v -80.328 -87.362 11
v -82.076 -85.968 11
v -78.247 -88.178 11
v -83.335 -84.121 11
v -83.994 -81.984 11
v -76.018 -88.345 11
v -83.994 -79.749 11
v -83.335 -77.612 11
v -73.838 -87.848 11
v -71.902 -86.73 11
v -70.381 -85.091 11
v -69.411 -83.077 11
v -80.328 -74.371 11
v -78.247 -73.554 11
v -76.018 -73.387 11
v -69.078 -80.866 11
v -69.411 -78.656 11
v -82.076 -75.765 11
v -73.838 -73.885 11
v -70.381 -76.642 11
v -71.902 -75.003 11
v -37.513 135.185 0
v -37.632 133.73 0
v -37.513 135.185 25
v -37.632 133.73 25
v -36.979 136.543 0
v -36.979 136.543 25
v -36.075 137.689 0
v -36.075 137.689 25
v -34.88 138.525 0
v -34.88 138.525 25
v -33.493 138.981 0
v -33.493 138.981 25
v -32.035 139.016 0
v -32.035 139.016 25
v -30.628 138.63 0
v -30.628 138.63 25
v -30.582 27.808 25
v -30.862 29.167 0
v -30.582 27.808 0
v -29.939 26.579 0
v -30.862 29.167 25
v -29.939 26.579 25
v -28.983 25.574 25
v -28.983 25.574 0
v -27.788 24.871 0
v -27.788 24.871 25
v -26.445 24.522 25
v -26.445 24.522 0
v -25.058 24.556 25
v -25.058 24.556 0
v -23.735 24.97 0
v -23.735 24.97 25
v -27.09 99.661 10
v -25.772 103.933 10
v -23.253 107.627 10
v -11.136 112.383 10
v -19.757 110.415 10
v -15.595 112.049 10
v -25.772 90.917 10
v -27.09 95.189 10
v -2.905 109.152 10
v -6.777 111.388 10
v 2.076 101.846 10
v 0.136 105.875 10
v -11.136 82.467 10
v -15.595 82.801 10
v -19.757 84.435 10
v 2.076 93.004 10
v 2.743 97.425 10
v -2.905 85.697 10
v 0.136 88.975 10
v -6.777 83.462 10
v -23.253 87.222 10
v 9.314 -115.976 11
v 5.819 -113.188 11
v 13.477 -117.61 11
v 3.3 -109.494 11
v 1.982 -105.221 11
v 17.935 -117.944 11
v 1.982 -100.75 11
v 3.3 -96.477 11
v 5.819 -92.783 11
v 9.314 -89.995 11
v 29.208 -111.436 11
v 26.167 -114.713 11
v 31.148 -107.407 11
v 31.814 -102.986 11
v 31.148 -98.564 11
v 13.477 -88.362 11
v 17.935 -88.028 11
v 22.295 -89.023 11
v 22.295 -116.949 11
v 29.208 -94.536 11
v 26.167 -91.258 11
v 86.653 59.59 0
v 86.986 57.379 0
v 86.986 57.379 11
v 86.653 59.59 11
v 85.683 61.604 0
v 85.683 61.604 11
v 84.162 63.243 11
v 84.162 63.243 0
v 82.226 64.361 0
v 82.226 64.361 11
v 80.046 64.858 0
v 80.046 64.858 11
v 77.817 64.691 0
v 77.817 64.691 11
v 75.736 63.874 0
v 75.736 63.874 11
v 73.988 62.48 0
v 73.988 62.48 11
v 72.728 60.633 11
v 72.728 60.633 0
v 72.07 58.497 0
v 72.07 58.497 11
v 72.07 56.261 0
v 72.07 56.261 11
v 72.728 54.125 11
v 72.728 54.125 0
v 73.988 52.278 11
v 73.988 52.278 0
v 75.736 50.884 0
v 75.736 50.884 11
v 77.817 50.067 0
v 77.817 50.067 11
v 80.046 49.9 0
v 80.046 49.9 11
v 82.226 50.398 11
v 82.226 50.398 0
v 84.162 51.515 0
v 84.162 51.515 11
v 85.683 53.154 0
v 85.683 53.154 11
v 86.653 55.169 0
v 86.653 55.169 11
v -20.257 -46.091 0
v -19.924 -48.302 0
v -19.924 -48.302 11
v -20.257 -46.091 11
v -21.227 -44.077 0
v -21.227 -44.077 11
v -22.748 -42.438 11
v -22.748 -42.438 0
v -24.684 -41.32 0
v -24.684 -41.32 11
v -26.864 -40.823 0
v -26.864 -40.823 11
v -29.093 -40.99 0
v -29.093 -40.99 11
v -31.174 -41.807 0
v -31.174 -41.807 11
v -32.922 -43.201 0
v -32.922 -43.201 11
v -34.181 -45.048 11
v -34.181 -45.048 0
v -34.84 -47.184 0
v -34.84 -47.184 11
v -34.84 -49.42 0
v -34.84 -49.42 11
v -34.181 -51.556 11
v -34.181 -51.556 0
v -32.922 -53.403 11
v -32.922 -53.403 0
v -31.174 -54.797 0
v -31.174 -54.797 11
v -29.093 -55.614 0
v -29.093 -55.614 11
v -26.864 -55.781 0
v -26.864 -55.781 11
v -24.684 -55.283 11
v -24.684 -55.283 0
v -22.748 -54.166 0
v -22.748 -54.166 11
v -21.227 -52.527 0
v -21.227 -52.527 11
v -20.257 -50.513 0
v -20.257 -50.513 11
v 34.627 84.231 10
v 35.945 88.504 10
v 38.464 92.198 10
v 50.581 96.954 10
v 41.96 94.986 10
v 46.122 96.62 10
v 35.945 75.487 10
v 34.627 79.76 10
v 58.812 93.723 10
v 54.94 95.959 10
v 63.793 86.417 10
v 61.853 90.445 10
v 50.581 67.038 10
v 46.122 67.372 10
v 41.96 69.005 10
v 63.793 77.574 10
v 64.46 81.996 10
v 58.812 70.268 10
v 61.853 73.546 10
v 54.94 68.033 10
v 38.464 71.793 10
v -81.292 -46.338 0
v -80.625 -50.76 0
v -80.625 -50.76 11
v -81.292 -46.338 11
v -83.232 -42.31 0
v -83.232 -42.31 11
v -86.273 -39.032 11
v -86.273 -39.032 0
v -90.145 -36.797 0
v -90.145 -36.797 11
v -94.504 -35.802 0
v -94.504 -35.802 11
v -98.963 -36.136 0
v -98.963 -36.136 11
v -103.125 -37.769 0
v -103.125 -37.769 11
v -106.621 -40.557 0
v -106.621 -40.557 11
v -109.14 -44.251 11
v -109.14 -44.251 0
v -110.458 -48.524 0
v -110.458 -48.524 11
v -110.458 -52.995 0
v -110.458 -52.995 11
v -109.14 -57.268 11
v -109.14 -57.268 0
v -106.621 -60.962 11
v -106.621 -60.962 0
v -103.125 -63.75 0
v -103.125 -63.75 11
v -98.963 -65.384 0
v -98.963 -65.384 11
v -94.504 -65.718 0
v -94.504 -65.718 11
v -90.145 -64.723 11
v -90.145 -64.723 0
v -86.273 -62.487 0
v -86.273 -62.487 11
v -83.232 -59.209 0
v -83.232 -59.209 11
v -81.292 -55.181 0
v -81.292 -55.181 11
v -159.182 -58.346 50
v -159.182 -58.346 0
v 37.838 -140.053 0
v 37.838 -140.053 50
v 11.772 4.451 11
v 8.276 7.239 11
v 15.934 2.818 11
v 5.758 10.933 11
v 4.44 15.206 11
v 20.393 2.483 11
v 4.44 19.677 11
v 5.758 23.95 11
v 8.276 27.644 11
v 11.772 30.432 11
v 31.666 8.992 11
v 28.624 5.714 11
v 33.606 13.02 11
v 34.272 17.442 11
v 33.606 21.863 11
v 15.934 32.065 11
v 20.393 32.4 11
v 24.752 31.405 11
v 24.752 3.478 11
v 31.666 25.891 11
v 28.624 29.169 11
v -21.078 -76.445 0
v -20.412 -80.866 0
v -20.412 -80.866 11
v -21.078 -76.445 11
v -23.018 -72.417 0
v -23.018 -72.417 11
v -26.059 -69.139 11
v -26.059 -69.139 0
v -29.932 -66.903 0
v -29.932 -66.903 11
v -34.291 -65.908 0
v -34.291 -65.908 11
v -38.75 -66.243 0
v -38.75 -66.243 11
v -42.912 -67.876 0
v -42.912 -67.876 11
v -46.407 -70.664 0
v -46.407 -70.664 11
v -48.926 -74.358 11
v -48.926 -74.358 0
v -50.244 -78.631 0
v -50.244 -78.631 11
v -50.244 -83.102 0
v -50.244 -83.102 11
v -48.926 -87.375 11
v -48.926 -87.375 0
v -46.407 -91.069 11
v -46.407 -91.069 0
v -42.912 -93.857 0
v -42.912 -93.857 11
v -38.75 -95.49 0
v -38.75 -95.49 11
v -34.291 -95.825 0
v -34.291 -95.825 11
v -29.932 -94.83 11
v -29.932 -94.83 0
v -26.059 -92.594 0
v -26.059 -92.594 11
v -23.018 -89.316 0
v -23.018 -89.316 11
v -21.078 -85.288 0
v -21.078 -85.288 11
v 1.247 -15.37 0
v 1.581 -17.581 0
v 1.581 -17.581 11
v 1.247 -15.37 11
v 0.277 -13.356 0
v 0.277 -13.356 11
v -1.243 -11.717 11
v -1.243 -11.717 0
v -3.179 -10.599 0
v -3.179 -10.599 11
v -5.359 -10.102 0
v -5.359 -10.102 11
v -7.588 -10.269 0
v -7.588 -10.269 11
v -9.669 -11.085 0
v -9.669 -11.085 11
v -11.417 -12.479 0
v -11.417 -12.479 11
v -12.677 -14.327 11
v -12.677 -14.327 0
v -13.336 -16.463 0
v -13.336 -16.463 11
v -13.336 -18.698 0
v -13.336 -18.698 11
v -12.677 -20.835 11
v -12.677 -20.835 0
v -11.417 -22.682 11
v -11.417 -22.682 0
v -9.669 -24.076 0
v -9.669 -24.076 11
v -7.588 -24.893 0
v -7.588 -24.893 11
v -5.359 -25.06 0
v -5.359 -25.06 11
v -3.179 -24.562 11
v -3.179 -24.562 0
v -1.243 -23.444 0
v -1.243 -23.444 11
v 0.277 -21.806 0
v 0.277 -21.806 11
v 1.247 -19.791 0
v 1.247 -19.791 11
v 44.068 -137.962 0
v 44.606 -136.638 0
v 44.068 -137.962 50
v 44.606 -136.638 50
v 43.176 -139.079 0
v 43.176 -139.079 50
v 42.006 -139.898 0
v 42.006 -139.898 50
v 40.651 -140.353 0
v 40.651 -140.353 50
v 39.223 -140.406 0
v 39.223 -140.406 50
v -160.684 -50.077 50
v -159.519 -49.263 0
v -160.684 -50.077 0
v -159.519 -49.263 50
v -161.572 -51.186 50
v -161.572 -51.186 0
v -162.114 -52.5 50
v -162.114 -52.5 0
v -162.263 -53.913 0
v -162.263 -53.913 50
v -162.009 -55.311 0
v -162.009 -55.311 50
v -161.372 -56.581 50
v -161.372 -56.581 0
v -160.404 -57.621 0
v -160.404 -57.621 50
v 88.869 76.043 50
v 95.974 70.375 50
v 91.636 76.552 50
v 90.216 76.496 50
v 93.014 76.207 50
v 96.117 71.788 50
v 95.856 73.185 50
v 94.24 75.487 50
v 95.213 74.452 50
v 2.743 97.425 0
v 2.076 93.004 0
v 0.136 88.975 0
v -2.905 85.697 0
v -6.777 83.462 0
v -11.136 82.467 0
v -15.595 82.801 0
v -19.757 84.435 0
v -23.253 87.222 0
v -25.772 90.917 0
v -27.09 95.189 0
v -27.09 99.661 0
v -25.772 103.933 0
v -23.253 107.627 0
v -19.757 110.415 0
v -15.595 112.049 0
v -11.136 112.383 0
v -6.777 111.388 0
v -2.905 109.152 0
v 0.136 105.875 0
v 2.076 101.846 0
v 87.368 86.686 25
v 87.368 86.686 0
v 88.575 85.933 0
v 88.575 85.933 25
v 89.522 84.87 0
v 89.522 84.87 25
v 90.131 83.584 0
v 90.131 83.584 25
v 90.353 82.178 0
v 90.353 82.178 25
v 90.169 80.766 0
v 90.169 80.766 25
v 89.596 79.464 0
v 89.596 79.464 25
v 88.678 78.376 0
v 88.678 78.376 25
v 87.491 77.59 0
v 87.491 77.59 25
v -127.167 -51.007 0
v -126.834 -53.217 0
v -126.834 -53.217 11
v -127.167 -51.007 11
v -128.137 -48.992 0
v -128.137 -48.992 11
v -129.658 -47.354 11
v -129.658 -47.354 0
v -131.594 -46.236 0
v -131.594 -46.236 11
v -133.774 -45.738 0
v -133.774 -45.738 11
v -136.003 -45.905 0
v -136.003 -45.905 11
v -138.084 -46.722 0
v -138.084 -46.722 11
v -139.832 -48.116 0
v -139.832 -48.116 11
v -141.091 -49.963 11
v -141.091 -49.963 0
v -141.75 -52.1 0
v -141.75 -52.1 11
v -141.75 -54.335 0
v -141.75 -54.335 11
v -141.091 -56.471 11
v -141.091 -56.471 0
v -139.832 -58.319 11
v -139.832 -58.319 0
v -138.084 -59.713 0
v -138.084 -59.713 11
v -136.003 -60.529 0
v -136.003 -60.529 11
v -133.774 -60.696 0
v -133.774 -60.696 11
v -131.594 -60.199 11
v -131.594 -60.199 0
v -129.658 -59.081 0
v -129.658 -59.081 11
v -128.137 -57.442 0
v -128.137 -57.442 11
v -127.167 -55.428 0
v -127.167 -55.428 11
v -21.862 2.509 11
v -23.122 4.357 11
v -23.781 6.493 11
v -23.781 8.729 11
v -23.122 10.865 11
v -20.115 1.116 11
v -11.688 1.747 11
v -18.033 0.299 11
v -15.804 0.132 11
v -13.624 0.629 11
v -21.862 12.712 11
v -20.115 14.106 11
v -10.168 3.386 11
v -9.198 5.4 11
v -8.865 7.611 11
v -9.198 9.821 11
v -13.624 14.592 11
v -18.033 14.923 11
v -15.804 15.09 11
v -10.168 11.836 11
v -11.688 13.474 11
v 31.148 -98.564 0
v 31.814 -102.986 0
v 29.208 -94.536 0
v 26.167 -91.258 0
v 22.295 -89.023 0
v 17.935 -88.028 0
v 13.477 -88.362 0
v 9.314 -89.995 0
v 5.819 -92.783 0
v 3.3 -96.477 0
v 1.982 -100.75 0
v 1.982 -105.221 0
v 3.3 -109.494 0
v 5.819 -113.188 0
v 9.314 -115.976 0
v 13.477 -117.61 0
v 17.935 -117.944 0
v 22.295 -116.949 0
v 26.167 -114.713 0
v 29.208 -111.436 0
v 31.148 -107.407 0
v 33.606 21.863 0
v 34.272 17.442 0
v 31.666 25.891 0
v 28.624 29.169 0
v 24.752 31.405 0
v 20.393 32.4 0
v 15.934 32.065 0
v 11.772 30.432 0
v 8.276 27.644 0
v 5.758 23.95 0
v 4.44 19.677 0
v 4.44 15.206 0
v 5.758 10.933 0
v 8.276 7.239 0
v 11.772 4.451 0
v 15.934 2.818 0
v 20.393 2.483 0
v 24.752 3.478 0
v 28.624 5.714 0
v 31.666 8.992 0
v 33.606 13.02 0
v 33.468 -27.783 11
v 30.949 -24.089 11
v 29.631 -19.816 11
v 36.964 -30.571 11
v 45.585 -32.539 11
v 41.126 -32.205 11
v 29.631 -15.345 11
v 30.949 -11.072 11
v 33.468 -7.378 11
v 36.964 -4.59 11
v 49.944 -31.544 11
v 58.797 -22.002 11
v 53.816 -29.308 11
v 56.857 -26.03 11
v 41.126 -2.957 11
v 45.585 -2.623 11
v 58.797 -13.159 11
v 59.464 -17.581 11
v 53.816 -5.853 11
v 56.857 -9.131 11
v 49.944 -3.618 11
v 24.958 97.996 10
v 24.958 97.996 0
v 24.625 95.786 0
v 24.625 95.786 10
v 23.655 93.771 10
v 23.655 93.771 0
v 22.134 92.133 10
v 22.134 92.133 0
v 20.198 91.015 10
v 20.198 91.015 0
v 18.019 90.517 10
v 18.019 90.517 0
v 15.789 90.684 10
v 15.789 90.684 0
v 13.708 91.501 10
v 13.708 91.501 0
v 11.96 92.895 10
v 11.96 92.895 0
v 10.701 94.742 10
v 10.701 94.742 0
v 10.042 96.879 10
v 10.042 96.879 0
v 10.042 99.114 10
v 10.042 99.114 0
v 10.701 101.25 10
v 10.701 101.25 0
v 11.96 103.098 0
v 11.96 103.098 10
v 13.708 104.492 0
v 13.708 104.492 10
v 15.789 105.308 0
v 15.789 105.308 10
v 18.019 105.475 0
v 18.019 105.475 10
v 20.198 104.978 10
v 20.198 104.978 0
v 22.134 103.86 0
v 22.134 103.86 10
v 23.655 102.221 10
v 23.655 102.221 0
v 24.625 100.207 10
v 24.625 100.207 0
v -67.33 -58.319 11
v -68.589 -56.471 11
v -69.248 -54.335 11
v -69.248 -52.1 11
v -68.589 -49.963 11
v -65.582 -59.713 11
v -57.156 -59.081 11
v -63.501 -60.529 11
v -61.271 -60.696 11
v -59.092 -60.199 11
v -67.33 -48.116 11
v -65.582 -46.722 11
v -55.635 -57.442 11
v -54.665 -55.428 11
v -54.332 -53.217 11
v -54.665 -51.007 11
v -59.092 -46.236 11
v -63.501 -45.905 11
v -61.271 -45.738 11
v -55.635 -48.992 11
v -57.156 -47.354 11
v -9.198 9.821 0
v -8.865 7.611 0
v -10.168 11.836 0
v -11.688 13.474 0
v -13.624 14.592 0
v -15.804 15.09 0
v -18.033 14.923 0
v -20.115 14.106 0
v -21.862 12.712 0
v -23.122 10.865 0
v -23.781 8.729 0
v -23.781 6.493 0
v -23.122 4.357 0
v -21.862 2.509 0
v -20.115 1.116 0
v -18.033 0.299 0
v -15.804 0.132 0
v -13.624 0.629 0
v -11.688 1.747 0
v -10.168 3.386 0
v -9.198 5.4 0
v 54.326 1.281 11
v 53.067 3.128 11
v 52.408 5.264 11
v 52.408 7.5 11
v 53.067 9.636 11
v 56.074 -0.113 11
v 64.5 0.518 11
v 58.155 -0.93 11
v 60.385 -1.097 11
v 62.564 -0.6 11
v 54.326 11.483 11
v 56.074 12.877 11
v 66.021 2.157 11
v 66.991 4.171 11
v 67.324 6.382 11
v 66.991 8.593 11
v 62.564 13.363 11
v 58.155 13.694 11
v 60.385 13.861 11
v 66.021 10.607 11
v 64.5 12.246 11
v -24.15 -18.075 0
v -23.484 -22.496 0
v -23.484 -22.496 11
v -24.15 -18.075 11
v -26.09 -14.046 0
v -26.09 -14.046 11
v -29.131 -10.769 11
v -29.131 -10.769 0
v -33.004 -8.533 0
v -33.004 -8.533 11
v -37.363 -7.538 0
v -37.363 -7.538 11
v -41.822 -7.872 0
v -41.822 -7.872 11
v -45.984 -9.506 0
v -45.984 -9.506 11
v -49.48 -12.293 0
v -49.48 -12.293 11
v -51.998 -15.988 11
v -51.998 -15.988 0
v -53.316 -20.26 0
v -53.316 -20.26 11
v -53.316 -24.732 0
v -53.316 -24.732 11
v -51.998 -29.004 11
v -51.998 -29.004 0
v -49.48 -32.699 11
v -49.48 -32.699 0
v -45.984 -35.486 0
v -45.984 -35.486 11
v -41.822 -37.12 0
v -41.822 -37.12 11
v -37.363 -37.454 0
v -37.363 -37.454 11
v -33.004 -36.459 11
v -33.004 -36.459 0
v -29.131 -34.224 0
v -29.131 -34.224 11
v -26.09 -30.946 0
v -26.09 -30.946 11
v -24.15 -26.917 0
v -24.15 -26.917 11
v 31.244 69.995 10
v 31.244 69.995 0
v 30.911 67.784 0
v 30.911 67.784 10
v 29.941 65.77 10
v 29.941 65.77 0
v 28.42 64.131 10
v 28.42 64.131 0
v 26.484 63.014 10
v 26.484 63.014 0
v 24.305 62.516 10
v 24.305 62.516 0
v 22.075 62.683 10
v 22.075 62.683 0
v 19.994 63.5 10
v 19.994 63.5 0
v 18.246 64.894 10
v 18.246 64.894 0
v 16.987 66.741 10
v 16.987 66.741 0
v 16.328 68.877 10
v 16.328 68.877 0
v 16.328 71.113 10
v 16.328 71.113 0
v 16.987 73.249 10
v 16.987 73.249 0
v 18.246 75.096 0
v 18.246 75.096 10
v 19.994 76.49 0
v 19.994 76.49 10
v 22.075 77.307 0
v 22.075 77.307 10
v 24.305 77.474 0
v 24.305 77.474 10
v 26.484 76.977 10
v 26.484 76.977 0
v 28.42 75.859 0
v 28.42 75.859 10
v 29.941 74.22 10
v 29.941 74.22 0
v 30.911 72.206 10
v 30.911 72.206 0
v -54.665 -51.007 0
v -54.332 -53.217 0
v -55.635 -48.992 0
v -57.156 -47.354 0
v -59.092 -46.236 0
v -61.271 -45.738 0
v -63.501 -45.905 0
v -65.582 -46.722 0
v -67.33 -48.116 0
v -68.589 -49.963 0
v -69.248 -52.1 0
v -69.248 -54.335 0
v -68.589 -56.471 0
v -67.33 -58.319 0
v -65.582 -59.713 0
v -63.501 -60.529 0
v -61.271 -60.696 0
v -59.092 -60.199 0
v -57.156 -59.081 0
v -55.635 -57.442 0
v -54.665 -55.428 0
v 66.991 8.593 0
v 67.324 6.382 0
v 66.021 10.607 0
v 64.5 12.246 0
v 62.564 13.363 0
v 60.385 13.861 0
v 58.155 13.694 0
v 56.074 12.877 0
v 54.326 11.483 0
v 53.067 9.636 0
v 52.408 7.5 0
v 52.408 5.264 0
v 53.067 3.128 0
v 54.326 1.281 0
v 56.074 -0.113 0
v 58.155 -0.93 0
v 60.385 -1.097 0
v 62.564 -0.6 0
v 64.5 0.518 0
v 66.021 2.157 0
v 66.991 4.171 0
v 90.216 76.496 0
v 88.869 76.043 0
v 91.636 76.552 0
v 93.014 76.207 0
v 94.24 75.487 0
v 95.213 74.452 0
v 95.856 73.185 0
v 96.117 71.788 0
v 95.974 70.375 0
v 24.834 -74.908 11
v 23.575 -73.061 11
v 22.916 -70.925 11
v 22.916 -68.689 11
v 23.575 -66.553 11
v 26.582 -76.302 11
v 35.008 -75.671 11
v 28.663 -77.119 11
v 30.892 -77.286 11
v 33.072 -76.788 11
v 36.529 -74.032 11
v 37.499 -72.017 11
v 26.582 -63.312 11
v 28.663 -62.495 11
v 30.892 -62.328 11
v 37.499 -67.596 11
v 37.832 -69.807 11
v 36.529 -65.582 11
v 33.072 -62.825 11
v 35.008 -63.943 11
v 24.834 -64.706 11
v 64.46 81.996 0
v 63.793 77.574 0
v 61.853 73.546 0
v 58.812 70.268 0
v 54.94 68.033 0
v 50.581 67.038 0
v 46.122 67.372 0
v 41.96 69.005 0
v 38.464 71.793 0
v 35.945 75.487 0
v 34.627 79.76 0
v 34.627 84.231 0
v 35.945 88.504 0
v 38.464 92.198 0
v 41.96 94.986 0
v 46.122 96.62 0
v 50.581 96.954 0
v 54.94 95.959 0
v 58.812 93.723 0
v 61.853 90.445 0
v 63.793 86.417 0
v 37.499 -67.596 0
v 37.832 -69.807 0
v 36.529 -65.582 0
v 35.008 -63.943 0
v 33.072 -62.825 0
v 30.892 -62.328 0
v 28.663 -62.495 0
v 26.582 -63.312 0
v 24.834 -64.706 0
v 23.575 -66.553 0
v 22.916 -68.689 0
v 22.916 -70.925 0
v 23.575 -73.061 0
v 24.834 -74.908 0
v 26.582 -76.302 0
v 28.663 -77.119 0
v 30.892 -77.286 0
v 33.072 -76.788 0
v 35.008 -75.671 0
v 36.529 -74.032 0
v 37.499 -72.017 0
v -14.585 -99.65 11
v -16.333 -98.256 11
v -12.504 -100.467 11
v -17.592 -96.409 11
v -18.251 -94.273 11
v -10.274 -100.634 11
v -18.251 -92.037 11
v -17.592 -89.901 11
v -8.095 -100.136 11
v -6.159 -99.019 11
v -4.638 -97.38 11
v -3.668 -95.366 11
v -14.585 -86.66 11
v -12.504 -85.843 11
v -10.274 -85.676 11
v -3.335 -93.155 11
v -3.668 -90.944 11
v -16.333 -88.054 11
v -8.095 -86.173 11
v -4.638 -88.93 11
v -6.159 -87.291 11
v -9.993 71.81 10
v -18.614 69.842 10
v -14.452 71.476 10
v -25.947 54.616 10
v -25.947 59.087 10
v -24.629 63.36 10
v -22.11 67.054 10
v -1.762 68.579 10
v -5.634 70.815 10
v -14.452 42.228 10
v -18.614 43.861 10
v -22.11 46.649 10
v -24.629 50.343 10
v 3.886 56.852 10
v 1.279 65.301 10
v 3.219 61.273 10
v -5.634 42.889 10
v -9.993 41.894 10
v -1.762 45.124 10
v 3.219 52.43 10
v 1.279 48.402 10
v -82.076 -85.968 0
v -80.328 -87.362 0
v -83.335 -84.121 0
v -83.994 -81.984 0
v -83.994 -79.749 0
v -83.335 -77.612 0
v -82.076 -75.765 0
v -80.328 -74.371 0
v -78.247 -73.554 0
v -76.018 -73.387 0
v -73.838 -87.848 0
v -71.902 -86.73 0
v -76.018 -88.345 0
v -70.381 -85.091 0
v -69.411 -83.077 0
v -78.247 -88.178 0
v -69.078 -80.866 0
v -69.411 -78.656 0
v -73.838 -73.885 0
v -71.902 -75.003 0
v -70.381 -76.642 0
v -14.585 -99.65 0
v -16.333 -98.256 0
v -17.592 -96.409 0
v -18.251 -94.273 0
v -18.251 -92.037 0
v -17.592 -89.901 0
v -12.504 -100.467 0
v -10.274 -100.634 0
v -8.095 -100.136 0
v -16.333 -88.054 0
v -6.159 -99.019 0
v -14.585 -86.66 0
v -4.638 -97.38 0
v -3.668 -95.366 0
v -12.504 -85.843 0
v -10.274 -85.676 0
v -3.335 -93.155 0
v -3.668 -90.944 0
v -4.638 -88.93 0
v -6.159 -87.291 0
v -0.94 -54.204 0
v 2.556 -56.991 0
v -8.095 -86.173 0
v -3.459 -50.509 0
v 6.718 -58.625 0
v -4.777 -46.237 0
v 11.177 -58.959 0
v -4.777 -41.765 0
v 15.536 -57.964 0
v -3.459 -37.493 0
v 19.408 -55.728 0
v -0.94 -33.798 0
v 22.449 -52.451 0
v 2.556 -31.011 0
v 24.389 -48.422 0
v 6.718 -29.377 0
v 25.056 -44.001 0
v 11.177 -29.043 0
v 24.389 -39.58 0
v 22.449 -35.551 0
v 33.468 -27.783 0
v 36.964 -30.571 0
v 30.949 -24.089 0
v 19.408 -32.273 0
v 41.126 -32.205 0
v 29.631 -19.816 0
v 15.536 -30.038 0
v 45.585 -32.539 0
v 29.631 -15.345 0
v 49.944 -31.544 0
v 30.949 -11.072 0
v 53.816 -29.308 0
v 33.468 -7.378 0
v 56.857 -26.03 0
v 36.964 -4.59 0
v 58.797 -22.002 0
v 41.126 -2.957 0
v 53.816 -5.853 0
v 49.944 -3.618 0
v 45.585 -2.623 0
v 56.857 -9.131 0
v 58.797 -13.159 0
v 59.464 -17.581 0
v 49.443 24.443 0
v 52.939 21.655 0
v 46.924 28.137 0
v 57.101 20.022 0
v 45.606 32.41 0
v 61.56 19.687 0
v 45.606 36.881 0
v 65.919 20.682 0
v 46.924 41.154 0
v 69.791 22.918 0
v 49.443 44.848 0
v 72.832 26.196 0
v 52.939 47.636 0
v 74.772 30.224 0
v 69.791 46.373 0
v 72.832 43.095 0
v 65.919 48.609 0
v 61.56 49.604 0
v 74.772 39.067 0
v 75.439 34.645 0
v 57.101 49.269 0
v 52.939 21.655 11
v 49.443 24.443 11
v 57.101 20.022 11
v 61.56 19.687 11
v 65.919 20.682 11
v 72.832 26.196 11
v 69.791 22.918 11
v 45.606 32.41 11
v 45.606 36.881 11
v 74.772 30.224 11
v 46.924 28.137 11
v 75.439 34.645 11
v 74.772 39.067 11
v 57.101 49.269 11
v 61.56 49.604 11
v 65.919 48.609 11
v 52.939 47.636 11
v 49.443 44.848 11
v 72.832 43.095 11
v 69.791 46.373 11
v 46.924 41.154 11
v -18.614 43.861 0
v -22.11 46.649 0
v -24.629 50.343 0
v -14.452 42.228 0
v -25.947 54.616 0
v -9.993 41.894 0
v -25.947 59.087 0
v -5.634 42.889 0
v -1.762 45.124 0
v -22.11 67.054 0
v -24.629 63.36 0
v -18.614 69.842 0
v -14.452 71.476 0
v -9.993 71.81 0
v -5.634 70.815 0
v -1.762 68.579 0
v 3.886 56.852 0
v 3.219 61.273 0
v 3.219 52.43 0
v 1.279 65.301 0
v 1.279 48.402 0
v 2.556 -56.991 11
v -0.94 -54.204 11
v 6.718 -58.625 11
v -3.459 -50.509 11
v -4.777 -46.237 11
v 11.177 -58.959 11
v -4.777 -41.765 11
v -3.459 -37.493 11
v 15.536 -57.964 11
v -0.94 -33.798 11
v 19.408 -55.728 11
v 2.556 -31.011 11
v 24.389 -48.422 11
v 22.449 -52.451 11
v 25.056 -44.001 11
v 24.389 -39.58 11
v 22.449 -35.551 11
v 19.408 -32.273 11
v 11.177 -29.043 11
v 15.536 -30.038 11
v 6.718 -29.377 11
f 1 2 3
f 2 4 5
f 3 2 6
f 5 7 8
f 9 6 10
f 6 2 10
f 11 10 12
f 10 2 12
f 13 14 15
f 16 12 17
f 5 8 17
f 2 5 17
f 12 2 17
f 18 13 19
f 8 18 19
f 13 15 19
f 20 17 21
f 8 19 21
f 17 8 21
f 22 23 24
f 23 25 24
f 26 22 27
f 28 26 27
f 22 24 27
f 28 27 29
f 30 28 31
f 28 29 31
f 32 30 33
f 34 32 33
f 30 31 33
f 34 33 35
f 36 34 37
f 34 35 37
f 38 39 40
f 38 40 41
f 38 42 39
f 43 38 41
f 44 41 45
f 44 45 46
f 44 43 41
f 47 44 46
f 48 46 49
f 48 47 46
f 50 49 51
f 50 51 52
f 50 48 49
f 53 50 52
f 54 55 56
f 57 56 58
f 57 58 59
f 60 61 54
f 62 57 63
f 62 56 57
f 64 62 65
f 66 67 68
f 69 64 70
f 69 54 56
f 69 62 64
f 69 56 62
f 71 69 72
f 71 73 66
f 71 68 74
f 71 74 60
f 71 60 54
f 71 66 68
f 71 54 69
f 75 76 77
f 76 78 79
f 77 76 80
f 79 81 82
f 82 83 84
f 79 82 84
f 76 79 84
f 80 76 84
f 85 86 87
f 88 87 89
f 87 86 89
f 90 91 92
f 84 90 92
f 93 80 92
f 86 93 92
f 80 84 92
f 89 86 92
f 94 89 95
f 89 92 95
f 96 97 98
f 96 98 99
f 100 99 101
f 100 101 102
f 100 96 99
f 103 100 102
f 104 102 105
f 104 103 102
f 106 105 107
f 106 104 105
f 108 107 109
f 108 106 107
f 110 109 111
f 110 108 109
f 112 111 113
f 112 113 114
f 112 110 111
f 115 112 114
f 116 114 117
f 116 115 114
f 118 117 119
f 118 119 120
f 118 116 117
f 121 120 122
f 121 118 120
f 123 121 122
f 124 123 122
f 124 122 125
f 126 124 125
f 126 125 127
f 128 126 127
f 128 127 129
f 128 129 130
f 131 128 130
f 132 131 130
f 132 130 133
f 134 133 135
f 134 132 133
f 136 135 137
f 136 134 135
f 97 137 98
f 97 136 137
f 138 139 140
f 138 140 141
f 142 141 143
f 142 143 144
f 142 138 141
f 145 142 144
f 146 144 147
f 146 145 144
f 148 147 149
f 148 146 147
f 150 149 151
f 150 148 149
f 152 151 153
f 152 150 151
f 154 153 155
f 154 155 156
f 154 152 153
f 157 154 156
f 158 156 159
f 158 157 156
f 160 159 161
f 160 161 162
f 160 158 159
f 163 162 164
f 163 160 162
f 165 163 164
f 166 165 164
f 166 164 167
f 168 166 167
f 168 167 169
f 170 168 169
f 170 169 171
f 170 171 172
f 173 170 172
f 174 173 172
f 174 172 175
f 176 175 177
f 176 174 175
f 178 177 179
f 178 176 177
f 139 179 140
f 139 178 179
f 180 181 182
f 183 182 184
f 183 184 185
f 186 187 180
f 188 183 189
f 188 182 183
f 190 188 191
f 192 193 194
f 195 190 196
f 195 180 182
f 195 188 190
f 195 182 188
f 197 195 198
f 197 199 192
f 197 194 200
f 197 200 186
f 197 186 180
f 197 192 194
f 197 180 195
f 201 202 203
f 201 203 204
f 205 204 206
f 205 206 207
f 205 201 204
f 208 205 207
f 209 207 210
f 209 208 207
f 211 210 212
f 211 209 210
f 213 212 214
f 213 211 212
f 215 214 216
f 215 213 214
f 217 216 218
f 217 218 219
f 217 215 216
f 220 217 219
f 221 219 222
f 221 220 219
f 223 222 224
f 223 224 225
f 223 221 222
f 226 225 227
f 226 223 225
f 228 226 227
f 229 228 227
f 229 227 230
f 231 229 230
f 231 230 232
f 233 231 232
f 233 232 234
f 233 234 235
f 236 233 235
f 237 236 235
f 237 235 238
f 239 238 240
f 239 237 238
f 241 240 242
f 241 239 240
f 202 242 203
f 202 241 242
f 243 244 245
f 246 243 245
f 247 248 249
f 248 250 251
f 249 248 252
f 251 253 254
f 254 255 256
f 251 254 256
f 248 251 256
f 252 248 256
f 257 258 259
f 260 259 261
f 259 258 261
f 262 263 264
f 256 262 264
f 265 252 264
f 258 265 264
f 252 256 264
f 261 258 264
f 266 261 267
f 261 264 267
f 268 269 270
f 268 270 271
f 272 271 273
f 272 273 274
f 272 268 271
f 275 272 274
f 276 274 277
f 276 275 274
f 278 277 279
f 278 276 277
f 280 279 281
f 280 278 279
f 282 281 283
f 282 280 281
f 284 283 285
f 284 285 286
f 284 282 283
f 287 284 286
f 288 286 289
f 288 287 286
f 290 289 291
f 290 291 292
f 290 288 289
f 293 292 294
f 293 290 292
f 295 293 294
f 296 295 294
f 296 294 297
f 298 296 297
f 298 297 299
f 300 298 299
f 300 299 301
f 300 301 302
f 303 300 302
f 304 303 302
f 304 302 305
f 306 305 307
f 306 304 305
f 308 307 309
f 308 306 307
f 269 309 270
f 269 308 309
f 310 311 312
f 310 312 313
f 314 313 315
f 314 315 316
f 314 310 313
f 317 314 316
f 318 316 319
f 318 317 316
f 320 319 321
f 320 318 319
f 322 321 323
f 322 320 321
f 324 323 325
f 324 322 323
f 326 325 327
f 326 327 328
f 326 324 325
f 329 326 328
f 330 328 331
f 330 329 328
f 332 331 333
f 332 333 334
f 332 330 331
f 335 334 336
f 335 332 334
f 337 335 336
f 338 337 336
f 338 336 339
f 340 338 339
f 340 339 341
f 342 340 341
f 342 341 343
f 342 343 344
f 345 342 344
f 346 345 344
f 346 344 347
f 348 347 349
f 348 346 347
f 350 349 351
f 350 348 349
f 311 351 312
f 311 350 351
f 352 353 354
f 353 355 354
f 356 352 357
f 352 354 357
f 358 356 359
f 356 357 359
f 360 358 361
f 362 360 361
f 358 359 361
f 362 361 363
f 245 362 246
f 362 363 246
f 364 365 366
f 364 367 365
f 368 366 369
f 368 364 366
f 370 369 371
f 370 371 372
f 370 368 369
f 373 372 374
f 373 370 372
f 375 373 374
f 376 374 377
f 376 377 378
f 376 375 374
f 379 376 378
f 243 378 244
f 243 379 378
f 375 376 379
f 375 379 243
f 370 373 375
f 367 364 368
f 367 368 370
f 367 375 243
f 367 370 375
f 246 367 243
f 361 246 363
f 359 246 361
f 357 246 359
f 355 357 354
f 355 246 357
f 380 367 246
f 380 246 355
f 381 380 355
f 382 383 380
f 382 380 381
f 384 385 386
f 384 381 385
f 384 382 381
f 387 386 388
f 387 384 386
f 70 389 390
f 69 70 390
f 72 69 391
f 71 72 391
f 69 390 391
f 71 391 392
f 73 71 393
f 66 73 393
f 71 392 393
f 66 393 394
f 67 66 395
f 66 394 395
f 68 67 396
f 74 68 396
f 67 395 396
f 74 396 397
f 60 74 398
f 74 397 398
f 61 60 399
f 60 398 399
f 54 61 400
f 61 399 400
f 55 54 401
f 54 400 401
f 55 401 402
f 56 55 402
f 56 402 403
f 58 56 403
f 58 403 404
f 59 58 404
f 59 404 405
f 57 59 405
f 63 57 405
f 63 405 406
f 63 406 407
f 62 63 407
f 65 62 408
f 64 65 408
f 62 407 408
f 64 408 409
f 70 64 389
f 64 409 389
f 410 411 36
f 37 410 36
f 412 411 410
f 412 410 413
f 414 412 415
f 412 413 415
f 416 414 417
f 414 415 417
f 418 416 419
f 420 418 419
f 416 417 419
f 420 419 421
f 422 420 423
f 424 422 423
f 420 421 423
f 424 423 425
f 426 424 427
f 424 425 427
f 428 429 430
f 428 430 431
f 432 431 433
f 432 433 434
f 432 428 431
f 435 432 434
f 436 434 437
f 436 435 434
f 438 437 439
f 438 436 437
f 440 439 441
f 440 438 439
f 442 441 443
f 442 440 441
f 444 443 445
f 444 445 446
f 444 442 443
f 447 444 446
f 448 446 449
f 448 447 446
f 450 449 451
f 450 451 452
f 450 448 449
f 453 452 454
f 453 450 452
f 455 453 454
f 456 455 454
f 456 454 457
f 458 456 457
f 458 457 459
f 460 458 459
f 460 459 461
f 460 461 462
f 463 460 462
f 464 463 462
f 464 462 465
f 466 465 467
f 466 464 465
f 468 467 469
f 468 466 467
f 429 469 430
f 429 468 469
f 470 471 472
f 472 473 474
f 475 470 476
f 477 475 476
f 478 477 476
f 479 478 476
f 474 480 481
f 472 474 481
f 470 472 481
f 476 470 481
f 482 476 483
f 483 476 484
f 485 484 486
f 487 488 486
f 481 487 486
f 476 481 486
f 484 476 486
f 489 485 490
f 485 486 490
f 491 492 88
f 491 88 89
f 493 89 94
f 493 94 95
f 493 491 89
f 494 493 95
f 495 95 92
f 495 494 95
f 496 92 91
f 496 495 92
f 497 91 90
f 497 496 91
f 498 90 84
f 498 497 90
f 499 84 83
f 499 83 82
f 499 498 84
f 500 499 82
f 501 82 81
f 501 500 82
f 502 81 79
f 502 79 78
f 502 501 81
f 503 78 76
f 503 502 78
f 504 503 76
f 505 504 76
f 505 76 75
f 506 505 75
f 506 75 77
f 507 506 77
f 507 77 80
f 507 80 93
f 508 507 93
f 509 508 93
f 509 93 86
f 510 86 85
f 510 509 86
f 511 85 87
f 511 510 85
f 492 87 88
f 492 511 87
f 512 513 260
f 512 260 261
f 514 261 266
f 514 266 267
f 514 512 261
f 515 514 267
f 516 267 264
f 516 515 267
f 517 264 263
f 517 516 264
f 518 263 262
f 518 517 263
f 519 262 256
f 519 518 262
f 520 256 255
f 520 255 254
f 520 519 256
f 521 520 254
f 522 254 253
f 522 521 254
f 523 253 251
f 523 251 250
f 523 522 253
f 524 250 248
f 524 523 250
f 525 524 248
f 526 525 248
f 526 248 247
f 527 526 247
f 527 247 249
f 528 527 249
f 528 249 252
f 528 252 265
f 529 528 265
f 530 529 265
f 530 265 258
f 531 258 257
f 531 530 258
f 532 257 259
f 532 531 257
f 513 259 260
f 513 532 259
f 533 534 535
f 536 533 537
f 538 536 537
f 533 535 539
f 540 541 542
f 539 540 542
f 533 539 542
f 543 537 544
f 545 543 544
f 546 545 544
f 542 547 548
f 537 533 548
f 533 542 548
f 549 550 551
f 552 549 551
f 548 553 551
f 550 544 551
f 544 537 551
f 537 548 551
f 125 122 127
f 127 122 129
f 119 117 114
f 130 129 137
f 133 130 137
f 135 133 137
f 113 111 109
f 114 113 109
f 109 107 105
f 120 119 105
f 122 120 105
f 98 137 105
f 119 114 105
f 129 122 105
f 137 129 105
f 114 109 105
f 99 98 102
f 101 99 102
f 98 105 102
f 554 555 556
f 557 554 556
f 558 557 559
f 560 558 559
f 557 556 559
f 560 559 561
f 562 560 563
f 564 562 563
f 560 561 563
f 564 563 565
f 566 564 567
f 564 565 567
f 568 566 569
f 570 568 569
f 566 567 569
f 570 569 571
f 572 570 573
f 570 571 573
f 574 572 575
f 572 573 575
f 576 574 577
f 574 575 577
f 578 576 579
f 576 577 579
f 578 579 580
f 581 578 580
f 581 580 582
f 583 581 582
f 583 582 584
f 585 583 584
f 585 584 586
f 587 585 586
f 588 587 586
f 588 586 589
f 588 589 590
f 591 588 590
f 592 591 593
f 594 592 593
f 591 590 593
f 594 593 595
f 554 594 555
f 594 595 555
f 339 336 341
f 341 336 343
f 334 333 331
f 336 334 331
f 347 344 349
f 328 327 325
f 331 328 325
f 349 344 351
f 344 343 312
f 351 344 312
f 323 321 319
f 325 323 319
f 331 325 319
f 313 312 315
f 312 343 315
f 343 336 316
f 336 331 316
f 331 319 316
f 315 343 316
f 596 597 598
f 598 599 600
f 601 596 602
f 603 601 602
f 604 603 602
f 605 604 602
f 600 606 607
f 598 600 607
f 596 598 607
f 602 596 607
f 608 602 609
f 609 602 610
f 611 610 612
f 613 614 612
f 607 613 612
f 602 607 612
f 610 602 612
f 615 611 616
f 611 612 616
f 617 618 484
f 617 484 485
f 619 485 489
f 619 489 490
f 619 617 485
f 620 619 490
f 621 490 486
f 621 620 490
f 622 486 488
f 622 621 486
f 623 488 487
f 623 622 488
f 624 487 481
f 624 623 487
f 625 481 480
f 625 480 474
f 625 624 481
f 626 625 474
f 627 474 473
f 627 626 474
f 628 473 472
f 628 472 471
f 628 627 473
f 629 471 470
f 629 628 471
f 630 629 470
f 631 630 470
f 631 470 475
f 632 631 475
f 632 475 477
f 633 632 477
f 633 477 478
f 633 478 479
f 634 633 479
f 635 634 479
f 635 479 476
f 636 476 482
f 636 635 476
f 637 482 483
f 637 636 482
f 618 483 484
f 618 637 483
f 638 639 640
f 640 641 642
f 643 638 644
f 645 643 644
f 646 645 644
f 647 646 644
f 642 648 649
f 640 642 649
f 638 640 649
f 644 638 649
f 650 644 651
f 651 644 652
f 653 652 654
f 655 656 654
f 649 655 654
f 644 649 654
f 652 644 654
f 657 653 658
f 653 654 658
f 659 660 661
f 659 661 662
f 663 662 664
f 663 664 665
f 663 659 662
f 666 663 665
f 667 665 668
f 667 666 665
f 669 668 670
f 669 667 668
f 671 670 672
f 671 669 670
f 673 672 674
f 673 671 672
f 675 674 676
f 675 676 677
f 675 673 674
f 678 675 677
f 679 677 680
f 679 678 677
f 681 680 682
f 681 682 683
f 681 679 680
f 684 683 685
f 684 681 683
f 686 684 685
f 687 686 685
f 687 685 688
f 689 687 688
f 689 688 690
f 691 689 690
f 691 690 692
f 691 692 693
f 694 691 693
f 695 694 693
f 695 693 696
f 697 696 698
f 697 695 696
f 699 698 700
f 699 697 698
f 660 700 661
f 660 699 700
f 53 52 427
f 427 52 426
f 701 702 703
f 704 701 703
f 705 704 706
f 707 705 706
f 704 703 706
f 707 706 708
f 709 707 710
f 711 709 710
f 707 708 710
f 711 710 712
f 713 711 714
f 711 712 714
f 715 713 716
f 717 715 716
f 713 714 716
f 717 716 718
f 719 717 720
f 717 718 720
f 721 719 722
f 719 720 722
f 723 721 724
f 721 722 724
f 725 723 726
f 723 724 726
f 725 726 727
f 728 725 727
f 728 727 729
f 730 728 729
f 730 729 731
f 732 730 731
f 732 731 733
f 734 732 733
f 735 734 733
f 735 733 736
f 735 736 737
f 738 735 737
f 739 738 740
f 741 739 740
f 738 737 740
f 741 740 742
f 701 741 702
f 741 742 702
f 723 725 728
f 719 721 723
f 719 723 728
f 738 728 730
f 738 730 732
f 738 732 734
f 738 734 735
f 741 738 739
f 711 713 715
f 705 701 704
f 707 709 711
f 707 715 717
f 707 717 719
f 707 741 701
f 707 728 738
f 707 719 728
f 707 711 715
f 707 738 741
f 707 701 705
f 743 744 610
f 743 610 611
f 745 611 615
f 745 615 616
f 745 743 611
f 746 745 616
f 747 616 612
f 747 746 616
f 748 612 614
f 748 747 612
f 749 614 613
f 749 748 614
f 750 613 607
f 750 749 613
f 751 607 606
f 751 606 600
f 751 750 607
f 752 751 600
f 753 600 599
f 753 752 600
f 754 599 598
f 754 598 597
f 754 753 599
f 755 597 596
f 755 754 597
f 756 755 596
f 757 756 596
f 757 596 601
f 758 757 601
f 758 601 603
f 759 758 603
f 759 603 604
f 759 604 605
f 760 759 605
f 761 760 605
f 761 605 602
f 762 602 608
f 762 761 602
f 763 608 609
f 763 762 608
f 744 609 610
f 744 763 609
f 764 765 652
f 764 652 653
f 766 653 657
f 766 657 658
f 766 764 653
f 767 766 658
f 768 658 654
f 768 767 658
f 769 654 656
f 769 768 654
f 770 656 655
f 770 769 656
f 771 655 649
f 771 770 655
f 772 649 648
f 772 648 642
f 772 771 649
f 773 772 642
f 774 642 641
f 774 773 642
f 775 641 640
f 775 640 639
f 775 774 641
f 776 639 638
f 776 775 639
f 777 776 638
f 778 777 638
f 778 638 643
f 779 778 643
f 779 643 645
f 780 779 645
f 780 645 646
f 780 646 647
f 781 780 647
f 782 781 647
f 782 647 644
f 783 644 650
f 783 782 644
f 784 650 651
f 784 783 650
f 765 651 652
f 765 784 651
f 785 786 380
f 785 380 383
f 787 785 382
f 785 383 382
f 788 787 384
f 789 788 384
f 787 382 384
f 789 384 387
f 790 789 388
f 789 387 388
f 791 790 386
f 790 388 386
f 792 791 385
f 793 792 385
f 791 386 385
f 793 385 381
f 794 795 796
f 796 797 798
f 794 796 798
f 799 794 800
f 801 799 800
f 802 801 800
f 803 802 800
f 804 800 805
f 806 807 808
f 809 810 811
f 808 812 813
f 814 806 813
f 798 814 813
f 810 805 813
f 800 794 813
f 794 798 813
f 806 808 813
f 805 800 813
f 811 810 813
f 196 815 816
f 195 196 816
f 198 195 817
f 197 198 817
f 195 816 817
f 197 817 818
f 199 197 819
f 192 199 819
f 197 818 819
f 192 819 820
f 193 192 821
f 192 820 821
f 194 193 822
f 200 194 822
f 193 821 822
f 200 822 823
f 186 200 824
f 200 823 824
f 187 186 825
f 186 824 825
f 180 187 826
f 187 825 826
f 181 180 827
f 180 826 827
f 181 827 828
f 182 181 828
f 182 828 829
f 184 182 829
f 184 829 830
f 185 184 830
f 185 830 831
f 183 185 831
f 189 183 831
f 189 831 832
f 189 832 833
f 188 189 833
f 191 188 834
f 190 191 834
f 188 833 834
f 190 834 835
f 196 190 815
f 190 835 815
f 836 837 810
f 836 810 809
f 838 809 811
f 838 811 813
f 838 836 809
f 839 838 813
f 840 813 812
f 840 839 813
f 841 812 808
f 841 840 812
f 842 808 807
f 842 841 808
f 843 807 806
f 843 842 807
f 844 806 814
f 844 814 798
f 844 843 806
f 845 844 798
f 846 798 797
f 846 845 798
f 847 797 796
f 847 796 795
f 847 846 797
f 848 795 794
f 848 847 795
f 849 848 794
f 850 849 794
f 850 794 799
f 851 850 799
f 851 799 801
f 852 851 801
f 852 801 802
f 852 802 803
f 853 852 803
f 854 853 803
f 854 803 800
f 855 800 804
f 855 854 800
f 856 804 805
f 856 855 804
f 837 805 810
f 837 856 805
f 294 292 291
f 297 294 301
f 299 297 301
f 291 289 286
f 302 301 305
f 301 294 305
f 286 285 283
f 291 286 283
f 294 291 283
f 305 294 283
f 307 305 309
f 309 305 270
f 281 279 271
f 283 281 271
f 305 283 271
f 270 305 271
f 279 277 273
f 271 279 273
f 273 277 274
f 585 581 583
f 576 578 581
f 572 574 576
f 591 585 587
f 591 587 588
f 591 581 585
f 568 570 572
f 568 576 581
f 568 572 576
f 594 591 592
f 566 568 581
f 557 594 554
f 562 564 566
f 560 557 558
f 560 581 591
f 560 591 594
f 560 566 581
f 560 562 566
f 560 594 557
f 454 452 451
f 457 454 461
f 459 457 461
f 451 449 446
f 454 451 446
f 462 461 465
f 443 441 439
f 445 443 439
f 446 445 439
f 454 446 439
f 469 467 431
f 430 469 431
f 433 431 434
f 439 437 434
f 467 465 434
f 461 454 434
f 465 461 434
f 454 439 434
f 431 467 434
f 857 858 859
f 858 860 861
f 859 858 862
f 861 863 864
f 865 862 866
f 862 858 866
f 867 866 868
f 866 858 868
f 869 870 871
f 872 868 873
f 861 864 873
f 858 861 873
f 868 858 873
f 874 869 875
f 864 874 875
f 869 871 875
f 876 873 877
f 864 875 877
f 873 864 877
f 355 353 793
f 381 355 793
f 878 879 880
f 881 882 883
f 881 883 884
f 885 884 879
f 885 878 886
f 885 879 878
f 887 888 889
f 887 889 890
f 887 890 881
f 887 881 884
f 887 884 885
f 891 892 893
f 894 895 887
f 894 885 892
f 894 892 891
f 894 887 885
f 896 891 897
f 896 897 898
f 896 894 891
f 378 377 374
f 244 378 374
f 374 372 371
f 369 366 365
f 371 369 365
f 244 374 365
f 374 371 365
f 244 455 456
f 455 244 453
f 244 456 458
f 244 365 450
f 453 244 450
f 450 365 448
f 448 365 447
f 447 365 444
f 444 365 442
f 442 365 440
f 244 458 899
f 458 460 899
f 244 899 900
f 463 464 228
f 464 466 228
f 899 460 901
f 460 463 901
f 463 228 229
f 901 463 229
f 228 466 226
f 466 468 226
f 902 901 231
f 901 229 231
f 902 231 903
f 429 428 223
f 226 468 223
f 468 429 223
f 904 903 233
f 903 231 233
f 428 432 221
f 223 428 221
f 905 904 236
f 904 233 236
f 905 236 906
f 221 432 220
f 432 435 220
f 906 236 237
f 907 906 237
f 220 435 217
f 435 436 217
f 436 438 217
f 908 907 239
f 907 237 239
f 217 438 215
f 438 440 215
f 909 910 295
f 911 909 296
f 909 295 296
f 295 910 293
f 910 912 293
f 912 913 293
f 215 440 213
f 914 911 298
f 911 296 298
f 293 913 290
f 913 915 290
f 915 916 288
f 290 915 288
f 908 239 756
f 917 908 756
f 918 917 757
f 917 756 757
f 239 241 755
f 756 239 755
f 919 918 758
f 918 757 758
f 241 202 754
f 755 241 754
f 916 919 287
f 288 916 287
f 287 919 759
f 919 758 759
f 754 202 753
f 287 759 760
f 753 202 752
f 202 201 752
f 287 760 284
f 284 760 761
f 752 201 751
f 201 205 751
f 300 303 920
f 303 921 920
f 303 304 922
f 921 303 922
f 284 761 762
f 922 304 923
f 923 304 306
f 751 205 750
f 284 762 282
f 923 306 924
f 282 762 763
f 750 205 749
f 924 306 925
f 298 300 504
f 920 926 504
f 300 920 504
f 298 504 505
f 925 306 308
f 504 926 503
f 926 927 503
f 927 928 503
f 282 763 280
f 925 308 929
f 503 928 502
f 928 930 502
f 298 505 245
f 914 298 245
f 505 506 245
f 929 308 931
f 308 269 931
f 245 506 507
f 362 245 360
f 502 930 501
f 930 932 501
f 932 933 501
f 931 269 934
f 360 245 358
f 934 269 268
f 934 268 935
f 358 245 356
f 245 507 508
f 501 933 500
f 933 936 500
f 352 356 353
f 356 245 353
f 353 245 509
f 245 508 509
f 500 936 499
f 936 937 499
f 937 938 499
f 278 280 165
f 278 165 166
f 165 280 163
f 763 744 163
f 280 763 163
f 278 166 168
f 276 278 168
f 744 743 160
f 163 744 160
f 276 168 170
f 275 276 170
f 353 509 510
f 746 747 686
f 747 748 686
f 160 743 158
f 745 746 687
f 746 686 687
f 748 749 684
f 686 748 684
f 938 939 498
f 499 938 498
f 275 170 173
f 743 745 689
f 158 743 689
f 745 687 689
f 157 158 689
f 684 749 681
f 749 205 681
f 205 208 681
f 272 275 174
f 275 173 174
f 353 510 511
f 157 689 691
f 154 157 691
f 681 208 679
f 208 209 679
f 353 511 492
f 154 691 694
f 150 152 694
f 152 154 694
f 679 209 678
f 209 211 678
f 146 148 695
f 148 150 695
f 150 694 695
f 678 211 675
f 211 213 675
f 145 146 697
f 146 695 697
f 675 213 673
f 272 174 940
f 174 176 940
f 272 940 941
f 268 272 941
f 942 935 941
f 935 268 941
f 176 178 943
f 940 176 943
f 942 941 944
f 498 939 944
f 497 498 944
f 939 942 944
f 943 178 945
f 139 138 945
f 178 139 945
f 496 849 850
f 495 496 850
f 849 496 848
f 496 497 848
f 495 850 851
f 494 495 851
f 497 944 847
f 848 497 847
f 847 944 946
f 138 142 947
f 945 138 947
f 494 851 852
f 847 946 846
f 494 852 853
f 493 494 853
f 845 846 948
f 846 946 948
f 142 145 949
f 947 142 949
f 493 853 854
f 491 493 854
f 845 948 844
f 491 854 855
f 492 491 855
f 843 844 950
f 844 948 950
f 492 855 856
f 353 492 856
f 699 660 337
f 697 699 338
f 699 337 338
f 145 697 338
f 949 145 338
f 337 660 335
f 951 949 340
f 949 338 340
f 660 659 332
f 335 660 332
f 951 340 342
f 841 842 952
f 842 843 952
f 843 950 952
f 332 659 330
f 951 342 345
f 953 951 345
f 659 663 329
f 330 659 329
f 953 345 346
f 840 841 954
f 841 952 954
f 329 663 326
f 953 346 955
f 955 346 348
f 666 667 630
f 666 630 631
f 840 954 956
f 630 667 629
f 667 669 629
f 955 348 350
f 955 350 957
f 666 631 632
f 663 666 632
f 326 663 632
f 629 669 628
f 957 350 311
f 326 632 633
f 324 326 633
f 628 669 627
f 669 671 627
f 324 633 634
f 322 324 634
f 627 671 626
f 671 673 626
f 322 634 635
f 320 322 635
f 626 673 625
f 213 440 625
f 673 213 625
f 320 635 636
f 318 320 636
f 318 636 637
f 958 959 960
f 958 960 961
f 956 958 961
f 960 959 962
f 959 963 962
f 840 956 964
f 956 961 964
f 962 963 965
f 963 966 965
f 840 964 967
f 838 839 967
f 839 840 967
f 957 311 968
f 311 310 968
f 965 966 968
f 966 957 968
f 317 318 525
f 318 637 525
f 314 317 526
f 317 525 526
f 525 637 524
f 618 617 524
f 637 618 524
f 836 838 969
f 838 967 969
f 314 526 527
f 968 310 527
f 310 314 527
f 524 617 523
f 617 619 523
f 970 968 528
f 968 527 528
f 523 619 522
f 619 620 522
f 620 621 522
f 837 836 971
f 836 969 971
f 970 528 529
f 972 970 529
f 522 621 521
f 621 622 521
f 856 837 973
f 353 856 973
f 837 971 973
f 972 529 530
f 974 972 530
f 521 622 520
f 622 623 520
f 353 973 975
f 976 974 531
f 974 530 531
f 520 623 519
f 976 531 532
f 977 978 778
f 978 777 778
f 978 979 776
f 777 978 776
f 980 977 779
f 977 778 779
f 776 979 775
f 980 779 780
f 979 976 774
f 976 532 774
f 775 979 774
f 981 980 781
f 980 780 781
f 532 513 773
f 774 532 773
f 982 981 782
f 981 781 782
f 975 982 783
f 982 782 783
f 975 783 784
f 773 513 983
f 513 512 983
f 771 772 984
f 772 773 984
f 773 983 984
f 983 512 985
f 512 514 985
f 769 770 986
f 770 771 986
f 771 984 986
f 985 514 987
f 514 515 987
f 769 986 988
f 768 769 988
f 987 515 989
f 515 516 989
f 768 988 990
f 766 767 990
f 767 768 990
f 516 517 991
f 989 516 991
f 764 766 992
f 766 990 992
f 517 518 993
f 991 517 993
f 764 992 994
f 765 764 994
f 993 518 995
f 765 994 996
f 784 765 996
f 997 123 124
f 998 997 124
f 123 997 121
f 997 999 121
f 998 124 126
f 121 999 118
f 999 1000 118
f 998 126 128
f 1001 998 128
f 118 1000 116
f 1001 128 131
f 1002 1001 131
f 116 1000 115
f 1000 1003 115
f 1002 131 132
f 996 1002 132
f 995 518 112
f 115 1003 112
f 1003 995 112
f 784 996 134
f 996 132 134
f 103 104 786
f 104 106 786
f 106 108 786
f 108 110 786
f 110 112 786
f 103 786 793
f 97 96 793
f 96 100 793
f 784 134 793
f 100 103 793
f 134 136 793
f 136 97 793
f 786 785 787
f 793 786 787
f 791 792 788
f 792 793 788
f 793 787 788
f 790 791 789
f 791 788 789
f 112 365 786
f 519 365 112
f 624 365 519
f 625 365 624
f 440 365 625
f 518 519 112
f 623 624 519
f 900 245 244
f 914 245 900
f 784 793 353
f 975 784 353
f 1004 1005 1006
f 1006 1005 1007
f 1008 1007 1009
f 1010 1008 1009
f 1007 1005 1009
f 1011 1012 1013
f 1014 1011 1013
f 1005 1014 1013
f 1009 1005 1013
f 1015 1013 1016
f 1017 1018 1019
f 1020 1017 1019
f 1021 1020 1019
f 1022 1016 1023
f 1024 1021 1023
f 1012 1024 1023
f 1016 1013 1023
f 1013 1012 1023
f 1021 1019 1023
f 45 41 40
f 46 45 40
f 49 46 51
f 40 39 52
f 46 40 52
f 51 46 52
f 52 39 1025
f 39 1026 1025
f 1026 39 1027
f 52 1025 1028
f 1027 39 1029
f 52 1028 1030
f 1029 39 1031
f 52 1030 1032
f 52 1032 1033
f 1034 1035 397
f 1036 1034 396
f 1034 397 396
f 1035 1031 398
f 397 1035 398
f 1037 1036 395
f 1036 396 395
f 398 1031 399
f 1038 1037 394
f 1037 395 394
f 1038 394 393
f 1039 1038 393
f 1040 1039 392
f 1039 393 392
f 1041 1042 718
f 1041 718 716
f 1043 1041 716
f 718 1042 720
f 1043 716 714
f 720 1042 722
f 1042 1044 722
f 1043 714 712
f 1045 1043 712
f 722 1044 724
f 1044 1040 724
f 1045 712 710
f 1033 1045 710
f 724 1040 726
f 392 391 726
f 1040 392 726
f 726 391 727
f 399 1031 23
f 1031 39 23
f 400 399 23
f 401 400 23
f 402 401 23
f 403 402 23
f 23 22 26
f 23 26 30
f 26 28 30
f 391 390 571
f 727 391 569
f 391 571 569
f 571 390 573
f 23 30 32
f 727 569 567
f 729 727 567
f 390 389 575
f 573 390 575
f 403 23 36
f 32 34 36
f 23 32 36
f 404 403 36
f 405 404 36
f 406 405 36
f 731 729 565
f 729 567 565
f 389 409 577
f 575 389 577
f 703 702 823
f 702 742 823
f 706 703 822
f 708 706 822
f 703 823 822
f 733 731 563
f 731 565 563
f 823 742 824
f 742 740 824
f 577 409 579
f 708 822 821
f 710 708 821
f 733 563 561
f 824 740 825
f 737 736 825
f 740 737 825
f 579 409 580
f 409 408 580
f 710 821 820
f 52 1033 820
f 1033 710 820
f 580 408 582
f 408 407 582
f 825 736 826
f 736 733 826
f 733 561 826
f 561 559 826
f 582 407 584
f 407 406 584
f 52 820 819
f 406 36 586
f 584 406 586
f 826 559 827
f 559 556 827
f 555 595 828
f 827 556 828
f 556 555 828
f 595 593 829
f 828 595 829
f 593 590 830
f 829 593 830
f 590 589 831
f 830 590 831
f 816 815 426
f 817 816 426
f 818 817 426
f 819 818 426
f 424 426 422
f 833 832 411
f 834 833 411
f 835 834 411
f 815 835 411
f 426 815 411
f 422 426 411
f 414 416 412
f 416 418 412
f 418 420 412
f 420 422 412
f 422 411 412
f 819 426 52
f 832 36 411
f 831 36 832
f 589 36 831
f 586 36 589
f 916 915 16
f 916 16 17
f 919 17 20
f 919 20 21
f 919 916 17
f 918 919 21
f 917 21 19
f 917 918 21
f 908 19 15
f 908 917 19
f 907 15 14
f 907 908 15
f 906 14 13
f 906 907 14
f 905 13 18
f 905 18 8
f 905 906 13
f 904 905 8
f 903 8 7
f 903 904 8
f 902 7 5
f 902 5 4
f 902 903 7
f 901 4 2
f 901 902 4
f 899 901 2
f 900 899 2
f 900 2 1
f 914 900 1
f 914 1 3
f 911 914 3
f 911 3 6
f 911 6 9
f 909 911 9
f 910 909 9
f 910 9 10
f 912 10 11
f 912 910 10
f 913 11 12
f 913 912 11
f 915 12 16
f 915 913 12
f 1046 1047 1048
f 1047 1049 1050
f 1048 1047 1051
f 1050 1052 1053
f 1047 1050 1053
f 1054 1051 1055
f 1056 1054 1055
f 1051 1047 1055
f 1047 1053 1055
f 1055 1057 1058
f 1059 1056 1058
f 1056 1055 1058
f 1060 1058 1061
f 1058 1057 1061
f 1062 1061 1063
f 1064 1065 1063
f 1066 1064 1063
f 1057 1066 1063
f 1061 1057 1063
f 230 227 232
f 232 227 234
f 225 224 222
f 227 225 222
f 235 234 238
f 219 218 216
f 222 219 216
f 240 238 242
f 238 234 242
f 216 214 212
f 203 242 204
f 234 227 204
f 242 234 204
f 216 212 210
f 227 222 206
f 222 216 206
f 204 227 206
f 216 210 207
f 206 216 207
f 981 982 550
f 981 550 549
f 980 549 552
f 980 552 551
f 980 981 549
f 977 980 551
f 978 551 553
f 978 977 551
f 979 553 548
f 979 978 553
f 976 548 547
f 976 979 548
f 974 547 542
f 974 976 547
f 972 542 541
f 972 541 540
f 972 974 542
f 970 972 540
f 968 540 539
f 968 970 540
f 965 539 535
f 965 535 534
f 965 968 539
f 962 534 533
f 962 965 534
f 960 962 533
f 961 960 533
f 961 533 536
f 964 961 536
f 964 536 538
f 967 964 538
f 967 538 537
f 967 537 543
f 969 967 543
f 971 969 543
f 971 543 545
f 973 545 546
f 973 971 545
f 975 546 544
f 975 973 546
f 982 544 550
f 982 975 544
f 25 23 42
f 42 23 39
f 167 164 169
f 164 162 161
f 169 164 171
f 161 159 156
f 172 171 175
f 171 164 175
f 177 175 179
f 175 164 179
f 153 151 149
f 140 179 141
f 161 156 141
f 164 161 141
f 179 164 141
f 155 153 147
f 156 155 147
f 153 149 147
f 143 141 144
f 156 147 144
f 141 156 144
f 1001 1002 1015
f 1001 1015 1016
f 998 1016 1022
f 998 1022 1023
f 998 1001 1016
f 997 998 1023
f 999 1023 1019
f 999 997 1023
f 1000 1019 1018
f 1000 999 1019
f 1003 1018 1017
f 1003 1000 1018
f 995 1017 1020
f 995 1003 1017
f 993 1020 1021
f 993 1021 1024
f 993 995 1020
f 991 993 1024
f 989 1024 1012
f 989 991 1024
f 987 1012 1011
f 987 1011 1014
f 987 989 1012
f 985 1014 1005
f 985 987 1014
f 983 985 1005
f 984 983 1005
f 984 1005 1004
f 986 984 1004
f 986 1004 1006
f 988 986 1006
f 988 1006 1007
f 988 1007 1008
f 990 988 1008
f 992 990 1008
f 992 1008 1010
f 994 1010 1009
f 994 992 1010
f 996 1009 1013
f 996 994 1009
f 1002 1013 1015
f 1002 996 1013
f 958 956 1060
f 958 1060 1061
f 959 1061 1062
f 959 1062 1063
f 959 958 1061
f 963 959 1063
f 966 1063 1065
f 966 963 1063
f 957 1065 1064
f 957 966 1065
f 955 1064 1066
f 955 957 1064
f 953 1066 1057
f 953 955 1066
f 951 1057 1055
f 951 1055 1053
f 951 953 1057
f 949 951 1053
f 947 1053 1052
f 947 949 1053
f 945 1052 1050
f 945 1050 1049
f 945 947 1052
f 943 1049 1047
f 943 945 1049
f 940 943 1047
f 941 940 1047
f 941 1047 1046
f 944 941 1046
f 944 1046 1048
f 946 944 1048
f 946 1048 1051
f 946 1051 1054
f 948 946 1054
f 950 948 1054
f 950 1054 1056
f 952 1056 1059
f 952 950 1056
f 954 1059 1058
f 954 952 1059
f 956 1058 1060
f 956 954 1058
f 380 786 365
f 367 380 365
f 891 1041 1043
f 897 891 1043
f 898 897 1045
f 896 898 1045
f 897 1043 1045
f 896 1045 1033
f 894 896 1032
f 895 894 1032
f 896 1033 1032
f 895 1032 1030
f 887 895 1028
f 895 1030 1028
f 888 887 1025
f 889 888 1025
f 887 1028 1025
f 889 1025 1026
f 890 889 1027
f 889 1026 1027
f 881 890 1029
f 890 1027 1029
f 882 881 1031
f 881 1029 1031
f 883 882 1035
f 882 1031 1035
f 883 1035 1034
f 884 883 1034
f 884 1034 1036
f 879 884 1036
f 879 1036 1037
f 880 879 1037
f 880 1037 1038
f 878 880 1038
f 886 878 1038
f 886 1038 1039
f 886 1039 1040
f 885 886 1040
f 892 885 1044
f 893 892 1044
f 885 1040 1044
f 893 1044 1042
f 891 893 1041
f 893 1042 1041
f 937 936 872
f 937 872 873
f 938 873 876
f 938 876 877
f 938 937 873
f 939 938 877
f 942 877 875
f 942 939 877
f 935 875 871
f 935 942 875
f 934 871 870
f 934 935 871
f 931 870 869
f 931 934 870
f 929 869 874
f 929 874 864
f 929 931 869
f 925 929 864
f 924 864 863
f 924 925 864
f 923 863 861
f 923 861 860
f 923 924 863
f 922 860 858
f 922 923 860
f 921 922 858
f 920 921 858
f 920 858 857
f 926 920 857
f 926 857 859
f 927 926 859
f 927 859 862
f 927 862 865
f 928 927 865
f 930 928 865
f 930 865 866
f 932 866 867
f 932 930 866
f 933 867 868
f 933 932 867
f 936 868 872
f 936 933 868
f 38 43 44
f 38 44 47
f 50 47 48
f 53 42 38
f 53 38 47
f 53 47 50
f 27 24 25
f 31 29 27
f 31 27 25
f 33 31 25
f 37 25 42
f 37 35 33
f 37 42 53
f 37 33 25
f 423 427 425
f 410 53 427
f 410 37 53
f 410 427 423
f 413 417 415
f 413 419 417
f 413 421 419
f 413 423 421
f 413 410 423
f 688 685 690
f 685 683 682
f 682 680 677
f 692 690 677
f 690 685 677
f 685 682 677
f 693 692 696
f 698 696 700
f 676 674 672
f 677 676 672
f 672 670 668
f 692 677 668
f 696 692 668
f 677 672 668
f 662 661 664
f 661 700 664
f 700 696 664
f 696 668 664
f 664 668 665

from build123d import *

# Parameters (mm, degrees)
F1_DEPTH = 50
F2_R     = 15
F2_R_2   = 7.5
F3_DEPTH = 11
F5_DEPTH = 25
F6_R     = 15
F6_R_2   = 7.5
F7_DEPTH = 10
F8_R     = 5
F8_2_R   = 5


with BuildPart() as f1:
    # F0 (on Top) → F1 (new body)
    with BuildSketch(Plane.XY):
        Polygon((98.598655, 80.951027), (-169.248063, -54.17164), (43.20677, -142.27921), align=None)
    extrude(amount=F1_DEPTH)

    # F2 (on Top) → F3 (cut)
    with BuildSketch(Plane.XY):
        with Locations((-95.625345, -50.759622)):
            Circle(F2_R)
        with Locations((-76.578173, -80.866444)):
            Circle(F2_R_2)
        with Locations((-134.334114, -53.217325)):
            Circle(F2_R_2)
        with Locations((-38.483825, -22.496073)):
            Circle(F2_R)
        with Locations((-35.411701, -80.866444)):
            Circle(F2_R)
        with Locations((-61.831972, -53.217325)):
            Circle(F2_R_2)
        with Locations((-27.424175, -48.301918)):
            Circle(F2_R_2)
        with Locations((-10.834703, -93.154945)):
            Circle(F2_R_2)
        with Locations((-5.919302, -17.580674)):
            Circle(F2_R_2)
        with Locations((-16.364525, 7.61075)):
            Circle(F2_R_2)
        with Locations((10.055749, -44.000947)):
            Circle(F2_R)
        with Locations((16.81442, -102.985743)):
            Circle(F2_R)
        with Locations((30.331768, -69.806798)):
            Circle(F2_R_2)
        with Locations((44.46355, -17.580674)):
            Circle(F2_R)
        with Locations((19.272124, 17.441551)):
            Circle(F2_R)
        with Locations((60.438588, 34.645449)):
            Circle(F2_R)
        with Locations((59.824175, 6.381901)):
            Circle(F2_R_2)
        with Locations((79.485764, 57.379173)):
            Circle(F2_R_2)
    extrude(amount=F3_DEPTH, mode=Mode.SUBTRACT)

    # F8
    f8_edges = [f1.edges().sort_by_distance(p)[0] for p in [
        (-169.248063, -54.17164, 25),
        (98.598655, 80.951027, 25),
        (43.20677, -142.27921, 25),
    ]]
    fillet(f8_edges, radius=F8_R)


with BuildPart() as f5:
    # F4 (on Top) → F5 (new body)
    with BuildSketch(Plane.XY):
        Polygon((-38.163792, 141.94721), (-30.38691, 21.822616), (97.390942, 82.273573), align=None)
    extrude(amount=F5_DEPTH)

    # F6 (on face) → F7 (cut)
    with BuildSketch(Plane(origin=(0, 0, 0), x_dir=(1, 0, 0), z_dir=(0, 0, -1))):
        with Locations((-11.114415, -56.851632)):
            Circle(F6_R)
        with Locations((23.744311, -69.995083)):
            Circle(F6_R_2)
        with Locations((49.459764, -81.995627)):
            Circle(F6_R)
        with Locations((17.458309, -97.996358)):
            Circle(F6_R_2)
        with Locations((-12.257317, -97.424898)):
            Circle(F6_R)
    extrude(amount=-F7_DEPTH, mode=Mode.SUBTRACT)

    # F8#2
    f8_2_edges = [f5.edges().sort_by_distance(p)[0] for p in [
        (-38.163792, 141.94721, 12.5),
        (97.390942, 82.273573, 12.5),
        (-30.38691, 21.822616, 12.5),
    ]]
    fillet(f8_2_edges, radius=F8_2_R)


solid = Compound([f1.part, f5.part])
